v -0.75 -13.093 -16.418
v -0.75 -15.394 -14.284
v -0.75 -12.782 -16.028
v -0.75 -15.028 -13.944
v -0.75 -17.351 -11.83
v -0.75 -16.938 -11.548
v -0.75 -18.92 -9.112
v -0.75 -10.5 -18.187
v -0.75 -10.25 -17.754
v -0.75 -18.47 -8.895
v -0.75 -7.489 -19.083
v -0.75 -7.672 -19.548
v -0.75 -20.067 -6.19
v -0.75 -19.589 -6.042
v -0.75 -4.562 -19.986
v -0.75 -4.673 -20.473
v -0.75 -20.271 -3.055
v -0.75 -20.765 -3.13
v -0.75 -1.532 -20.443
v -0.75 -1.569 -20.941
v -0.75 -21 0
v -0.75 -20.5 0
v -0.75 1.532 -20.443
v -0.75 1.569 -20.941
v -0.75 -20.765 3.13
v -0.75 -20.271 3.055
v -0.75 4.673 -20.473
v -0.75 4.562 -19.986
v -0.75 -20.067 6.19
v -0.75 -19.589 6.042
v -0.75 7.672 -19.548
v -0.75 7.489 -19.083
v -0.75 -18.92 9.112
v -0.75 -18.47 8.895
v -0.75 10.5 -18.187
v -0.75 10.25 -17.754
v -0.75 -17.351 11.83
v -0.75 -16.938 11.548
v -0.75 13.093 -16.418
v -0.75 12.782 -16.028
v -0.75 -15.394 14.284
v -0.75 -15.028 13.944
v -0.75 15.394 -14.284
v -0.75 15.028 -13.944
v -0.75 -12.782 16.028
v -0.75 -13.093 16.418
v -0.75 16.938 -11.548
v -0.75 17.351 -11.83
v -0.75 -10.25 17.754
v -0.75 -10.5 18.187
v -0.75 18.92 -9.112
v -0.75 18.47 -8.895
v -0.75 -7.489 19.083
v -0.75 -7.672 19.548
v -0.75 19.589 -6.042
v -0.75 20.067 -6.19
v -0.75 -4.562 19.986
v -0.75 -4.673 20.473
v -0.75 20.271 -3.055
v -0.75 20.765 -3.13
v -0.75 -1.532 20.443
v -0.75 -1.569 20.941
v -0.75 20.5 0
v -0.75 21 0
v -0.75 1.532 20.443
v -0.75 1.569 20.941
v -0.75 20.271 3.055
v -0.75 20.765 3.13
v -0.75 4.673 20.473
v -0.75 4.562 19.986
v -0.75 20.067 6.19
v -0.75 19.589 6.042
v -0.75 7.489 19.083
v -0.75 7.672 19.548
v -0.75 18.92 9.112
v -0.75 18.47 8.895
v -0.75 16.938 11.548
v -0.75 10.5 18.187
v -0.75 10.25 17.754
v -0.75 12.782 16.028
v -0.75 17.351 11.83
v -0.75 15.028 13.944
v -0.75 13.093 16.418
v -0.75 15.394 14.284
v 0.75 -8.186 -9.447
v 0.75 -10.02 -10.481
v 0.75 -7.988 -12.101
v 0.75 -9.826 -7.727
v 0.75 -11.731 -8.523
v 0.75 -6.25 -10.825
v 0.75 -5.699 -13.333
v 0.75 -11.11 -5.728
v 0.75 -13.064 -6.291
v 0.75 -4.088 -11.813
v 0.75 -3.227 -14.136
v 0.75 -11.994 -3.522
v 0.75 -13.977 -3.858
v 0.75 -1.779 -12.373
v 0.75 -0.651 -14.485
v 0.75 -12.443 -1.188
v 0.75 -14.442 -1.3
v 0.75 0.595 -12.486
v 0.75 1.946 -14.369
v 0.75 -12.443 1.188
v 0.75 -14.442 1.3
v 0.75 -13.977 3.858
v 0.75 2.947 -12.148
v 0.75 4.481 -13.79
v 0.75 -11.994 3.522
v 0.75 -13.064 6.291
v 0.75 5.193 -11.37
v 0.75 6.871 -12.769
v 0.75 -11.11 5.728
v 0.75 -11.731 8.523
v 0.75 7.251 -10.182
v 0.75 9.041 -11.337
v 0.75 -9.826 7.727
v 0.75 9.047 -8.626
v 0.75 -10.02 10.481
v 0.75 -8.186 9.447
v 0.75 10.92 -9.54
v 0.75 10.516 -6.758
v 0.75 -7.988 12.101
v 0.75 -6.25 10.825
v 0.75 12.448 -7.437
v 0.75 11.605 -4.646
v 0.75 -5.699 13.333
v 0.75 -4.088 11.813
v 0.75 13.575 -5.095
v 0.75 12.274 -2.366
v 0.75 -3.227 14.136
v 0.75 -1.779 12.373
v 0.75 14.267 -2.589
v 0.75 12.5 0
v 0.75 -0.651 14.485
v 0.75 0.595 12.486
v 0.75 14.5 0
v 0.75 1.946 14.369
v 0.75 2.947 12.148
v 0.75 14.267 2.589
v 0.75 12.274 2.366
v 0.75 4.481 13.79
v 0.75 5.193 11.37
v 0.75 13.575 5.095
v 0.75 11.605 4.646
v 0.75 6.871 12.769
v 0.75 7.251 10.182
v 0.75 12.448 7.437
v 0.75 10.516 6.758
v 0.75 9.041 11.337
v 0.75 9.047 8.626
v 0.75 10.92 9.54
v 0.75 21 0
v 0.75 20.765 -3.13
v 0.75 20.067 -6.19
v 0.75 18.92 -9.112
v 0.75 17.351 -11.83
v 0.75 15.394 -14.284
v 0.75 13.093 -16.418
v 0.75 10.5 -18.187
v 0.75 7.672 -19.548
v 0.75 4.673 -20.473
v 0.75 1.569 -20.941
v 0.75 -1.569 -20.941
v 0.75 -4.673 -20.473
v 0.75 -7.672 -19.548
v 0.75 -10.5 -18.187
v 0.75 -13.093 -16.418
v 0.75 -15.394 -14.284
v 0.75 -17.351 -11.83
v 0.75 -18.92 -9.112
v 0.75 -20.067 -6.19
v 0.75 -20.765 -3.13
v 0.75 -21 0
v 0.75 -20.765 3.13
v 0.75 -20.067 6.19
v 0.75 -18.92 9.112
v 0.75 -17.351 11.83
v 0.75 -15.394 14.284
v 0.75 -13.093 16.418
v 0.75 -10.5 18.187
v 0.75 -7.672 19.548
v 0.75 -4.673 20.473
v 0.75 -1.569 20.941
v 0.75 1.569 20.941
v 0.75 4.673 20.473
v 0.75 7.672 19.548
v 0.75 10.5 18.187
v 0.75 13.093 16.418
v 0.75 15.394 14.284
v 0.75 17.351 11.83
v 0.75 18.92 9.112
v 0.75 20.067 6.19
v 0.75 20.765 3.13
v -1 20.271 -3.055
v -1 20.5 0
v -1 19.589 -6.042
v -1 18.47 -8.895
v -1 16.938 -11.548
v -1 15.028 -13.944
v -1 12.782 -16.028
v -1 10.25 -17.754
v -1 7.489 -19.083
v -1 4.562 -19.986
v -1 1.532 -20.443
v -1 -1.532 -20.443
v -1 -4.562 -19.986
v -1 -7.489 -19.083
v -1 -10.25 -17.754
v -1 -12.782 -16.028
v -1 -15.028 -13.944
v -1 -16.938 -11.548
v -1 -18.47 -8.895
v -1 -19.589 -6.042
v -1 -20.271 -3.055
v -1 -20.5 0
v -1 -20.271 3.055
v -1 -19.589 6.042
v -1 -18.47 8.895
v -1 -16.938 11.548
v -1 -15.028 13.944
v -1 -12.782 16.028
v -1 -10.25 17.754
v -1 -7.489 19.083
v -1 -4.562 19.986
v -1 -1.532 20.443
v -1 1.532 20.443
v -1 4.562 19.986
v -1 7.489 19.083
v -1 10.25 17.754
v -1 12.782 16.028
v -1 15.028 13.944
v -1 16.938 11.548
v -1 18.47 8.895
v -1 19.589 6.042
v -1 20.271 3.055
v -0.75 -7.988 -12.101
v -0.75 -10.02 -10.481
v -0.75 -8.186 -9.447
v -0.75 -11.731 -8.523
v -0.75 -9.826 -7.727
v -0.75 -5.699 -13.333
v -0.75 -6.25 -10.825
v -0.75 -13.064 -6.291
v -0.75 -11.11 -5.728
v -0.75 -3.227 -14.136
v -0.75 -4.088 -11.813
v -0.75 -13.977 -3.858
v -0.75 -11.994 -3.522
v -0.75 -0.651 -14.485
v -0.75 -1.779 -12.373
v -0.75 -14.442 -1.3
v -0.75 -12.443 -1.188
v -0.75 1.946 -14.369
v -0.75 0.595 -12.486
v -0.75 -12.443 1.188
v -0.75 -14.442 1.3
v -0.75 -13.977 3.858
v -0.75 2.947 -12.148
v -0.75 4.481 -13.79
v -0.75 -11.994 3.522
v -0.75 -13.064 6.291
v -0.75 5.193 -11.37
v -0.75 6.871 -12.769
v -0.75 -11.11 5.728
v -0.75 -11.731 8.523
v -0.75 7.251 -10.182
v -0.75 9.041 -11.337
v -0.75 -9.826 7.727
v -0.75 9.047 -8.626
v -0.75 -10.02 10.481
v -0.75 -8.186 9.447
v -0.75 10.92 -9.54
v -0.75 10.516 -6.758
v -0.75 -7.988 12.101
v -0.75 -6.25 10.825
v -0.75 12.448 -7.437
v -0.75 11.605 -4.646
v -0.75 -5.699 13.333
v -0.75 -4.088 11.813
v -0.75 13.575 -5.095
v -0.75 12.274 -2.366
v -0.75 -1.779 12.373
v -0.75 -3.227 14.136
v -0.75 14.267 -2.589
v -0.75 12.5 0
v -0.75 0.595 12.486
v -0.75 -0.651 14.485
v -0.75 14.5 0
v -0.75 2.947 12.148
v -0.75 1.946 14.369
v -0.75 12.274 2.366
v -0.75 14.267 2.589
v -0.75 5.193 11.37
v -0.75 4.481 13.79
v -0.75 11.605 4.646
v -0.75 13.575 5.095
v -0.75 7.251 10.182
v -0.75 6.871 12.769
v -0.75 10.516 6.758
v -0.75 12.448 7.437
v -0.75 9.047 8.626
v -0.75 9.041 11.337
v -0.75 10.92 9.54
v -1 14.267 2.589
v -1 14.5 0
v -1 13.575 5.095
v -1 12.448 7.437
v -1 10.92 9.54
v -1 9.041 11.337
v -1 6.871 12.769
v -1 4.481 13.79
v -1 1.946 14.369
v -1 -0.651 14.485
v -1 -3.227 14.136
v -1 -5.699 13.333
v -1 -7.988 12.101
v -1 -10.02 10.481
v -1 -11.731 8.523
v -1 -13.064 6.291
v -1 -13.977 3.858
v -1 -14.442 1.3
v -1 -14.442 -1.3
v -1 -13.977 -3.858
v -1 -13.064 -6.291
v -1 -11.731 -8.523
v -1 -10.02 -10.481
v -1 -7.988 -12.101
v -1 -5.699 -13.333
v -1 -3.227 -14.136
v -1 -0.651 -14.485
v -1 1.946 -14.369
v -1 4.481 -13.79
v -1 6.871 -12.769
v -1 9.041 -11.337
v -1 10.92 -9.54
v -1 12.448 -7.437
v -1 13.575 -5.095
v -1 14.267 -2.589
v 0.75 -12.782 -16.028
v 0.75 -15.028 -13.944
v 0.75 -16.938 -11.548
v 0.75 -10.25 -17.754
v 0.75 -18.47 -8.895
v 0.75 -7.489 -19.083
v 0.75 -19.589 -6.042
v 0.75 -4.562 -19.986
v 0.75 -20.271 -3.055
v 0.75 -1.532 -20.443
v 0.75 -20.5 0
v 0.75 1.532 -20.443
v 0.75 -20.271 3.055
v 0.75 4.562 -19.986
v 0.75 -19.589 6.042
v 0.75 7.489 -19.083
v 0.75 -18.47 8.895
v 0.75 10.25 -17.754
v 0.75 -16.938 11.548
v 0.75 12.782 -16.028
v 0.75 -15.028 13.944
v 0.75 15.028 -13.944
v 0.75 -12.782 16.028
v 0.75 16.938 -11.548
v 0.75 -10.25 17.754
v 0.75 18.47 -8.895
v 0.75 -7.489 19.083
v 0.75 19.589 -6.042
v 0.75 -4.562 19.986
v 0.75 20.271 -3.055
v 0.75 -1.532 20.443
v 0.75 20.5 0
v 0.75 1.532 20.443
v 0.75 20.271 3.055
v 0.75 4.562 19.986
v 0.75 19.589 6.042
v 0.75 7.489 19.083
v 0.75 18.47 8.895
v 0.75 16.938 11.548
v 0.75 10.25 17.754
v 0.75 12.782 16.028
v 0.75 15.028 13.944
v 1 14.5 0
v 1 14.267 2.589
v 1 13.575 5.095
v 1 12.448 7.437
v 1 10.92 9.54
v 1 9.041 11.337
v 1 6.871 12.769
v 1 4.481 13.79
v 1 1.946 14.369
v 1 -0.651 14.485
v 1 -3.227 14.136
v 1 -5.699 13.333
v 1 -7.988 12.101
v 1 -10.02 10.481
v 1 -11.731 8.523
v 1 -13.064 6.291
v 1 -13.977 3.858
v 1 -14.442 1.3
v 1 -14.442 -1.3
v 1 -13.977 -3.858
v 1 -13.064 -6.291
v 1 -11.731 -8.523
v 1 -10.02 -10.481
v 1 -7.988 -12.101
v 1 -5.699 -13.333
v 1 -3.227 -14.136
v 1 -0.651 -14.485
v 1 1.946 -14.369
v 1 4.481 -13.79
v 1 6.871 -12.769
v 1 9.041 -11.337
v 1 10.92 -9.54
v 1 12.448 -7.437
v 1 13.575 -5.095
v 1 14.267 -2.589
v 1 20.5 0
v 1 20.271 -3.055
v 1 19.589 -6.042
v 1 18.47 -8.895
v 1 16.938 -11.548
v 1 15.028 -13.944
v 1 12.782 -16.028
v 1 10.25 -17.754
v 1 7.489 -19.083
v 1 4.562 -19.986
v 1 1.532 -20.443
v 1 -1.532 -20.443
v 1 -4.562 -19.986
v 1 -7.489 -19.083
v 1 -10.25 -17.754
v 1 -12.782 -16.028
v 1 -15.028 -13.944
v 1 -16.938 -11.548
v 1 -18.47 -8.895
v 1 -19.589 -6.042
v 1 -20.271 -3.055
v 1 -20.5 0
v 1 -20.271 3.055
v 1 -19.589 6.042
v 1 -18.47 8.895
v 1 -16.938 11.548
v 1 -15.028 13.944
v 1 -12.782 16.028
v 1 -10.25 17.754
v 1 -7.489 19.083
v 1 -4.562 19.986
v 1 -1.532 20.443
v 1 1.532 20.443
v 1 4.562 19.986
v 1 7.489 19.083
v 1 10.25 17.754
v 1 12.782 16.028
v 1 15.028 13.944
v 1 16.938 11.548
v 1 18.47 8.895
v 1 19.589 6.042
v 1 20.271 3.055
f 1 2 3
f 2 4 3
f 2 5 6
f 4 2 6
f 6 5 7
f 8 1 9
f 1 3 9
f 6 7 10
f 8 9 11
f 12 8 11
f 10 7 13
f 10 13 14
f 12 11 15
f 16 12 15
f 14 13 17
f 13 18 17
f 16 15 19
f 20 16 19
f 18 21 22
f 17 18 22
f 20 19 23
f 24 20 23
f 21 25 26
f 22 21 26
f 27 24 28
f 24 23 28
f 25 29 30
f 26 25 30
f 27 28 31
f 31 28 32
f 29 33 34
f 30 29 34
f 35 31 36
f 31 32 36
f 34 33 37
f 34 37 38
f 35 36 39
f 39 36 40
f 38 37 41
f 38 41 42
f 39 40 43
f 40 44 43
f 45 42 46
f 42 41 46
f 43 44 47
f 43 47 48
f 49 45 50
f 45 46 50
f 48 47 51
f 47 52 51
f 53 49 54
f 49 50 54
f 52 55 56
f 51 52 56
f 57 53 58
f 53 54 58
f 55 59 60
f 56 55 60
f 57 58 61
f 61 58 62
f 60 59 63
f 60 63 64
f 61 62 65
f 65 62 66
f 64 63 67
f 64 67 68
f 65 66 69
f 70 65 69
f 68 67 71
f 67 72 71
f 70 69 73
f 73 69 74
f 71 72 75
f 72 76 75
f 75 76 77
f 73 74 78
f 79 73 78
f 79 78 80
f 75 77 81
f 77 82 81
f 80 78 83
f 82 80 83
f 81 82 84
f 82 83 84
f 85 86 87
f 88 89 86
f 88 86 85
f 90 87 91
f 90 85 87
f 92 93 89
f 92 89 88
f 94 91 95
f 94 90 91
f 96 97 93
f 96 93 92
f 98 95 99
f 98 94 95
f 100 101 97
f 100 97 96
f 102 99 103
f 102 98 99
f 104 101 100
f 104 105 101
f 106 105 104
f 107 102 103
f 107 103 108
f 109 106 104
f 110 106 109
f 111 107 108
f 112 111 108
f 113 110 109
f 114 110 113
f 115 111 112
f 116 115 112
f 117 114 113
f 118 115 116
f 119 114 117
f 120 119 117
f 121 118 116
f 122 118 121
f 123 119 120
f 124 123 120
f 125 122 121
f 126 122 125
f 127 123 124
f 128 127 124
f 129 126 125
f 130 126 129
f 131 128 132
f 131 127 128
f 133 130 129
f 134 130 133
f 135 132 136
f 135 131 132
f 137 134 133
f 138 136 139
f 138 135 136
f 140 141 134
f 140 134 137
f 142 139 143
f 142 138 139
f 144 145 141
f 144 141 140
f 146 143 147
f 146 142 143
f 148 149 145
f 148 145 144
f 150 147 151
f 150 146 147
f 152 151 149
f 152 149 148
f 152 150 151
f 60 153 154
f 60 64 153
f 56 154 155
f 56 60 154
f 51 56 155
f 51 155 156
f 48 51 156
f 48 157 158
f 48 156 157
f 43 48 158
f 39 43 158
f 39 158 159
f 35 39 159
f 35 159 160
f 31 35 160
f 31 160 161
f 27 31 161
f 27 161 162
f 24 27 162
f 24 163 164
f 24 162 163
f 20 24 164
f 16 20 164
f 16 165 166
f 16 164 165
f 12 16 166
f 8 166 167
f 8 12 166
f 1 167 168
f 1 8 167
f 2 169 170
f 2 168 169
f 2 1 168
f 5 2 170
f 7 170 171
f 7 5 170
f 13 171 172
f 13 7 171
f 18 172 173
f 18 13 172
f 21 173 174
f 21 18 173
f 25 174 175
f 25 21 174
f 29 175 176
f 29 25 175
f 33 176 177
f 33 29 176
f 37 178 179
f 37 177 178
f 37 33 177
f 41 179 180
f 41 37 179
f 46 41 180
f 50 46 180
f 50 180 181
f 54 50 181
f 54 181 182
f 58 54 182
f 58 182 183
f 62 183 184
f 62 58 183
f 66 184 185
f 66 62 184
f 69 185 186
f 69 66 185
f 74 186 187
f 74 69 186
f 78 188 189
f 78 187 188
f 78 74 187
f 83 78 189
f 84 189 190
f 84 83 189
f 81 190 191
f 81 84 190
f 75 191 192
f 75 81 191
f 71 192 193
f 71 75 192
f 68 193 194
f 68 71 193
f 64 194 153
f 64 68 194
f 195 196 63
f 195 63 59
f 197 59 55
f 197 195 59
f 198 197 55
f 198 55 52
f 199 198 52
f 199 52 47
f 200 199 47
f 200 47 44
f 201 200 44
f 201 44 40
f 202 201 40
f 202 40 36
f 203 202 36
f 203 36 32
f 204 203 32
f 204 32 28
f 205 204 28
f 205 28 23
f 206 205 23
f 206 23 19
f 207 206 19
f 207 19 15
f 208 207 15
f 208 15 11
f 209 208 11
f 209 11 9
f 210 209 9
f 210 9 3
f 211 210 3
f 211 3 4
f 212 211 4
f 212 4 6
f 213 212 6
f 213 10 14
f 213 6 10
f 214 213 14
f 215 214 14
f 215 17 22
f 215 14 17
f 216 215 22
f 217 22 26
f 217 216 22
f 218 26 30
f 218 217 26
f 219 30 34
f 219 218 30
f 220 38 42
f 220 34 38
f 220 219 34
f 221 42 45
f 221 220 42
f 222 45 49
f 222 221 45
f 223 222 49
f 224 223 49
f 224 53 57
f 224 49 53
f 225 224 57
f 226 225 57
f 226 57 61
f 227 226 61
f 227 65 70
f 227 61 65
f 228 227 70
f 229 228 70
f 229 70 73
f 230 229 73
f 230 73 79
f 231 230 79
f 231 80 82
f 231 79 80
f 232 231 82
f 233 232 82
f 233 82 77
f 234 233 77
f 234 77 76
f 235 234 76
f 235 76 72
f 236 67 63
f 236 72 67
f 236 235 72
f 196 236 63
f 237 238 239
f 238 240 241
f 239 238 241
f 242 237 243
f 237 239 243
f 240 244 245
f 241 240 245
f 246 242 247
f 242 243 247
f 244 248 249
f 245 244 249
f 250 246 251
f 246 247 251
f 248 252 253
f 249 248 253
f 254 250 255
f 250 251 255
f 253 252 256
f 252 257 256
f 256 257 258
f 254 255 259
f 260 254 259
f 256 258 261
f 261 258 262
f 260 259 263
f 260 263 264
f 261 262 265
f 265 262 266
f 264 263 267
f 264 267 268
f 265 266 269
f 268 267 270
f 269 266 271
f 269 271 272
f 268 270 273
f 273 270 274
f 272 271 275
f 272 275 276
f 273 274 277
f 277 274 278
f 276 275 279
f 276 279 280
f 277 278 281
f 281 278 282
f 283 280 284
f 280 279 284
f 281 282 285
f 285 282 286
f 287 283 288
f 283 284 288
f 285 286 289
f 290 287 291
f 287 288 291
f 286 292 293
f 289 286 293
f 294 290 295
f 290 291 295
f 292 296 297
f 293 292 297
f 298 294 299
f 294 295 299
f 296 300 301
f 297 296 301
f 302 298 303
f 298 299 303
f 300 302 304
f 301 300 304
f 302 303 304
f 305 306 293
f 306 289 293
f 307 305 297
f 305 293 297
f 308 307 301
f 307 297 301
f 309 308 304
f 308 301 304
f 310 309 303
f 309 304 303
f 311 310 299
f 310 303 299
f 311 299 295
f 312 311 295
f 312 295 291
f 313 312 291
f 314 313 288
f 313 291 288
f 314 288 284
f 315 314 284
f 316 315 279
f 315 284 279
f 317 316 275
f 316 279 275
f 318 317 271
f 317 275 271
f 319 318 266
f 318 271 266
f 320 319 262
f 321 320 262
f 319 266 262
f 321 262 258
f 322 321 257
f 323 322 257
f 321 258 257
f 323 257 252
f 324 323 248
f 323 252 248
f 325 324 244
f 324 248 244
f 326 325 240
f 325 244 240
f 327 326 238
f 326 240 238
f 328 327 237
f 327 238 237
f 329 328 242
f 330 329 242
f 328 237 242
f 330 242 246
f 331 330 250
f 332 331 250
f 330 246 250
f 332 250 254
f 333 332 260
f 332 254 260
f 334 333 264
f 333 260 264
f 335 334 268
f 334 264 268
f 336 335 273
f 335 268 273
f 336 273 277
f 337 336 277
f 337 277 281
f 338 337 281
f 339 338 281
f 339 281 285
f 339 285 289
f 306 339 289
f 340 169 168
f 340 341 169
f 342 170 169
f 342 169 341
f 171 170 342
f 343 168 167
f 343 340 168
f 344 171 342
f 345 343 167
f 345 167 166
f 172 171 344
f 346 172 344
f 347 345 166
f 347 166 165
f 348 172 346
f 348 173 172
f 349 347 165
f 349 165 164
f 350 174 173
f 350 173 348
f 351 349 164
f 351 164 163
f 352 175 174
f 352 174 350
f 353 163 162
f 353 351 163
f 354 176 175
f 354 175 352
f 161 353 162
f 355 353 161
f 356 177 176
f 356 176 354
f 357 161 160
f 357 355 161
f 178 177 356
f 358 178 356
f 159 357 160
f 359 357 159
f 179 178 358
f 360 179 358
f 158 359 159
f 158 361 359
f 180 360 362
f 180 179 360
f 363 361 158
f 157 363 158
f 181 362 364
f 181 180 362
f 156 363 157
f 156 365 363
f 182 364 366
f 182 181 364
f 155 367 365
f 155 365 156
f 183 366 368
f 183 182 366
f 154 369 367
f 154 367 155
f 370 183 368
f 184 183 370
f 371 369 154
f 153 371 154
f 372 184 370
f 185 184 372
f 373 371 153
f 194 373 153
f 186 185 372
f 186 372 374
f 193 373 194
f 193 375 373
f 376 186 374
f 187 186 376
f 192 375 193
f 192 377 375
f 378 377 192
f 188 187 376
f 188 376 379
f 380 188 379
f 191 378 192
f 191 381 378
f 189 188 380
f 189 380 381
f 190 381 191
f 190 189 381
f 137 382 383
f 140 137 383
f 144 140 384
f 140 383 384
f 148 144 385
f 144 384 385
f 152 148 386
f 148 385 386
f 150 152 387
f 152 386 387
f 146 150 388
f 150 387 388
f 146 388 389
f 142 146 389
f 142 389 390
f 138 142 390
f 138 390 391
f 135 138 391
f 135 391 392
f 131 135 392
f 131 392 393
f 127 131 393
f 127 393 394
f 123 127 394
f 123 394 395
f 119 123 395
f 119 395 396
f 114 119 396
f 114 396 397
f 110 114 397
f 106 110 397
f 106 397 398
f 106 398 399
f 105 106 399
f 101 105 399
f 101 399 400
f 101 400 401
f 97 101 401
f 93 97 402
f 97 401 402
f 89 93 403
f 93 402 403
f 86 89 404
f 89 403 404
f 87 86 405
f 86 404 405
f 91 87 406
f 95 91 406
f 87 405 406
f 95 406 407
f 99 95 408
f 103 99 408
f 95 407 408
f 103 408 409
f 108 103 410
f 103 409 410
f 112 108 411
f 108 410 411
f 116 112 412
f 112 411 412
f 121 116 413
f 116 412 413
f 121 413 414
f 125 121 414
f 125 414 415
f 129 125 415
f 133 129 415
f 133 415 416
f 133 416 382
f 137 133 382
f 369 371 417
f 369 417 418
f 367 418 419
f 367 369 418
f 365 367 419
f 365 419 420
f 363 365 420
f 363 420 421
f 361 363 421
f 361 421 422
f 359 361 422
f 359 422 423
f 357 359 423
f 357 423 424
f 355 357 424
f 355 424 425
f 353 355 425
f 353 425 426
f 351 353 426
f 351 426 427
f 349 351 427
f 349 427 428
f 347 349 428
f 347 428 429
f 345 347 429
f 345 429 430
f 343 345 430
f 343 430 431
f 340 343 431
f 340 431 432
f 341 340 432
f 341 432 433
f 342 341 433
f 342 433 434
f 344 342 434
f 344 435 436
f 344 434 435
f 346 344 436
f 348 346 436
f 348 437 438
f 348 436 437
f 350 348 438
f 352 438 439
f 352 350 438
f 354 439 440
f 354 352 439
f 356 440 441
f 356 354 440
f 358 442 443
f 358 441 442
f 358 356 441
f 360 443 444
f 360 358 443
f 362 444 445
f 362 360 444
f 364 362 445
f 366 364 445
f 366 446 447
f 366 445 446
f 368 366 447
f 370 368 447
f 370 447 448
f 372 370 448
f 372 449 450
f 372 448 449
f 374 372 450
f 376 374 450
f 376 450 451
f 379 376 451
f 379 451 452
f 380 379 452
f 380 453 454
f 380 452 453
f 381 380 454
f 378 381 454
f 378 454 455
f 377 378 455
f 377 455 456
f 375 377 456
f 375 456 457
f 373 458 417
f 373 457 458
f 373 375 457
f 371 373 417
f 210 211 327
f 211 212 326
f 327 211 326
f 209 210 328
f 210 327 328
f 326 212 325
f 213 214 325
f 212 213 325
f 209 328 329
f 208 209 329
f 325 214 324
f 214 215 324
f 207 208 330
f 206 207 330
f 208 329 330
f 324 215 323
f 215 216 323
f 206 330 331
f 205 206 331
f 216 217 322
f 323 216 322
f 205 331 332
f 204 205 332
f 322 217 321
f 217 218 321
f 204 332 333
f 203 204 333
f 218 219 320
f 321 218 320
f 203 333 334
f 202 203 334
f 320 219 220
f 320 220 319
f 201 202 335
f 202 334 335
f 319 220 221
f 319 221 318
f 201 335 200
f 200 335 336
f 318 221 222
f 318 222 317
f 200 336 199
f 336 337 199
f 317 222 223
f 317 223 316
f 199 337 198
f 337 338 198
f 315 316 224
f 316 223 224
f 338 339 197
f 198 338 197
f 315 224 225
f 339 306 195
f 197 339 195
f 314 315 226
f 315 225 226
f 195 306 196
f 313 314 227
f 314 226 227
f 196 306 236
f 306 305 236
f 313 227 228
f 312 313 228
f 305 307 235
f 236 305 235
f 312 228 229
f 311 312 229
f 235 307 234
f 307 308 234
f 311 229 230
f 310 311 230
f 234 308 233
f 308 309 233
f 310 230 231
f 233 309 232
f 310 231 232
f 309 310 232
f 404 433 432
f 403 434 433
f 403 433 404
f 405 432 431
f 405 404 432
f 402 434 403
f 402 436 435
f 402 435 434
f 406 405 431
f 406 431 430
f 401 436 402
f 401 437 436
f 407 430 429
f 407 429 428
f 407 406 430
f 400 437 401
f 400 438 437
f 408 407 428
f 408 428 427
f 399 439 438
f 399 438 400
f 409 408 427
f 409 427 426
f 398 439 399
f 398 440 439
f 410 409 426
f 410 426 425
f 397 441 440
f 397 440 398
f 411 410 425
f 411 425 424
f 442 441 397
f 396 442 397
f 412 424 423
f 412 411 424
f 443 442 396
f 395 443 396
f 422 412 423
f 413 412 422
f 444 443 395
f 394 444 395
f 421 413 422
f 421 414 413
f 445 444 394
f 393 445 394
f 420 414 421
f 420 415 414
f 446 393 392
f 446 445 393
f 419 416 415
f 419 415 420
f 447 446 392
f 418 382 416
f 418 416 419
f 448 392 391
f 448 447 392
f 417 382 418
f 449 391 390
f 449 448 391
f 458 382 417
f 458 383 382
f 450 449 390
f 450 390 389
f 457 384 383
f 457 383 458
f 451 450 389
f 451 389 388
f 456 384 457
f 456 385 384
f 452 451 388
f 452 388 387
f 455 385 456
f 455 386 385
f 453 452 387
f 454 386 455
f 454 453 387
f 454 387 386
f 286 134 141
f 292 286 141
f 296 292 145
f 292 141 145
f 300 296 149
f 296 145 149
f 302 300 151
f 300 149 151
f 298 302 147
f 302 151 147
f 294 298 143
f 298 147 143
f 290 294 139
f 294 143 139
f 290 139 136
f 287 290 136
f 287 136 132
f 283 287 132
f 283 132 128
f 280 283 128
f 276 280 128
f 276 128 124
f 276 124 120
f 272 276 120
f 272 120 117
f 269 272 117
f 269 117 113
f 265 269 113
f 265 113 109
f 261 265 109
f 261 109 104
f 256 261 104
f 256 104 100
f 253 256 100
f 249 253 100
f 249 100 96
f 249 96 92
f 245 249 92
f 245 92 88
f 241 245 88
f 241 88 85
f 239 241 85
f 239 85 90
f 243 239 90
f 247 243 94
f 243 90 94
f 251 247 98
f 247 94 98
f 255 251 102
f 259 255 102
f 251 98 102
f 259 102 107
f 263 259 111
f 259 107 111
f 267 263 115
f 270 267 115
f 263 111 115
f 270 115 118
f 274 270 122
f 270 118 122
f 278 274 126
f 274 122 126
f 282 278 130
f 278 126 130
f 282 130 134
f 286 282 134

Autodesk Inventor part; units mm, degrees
sketch "Sketch_1" plane through (0, 0, 0) normal (0, 0, 1) x (1, 0, 0)
  line L0 (50, 0) -> (-50, 0)
  line L1 (-1, 20.5) -> (-1, 14.5)
  line L2 (-1, 14.5) -> (-0.75, 14.5)
  line L3 (-0.75, 14.5) -> (-0.75, 12.5)
  line L4 (-0.75, 12.5) -> (0.75, 12.5)
  line L5 (0.75, 12.5) -> (0.75, 14.5)
  line L6 (0.75, 14.5) -> (1, 14.5)
  line L7 (1, 14.5) -> (1, 20.5)
  line L8 (1, 20.5) -> (0.75, 20.5)
  line L9 (0.75, 20.5) -> (0.75, 21)
  line L10 (0.75, 21) -> (-0.75, 21)
  line L11 (-0.75, 21) -> (-0.75, 20.5)
  line L12 (-0.75, 20.5) -> (-1, 20.5)
revolve "Revolution1" add sketch "Sketch_1" angle 360 about axis through (50, 0, 0) along (1, 0, 0)
ref_plane "core_to_washer_XY" through (0, 0, 0) normal (1, 0, 0) x (0, 0, -1)
ref_plane "core_to_washer_YZ" through (0, 0, 0) normal (0, 0, -1) x (0, 1, 0)
ref_plane "core_to_washer_ZX" through (0, 0, 0) normal (0, 1, 0) x (1, 0, 0)
ref_plane "core_to_washer1_XY" through (0, 0, 0) normal (-1, 0, 0) x (0, 0, -1)
ref_plane "core_to_washer1_YZ" through (0, 0, 0) normal (0, 0, -1) x (0, -1, 0)
ref_plane "core_to_washer1_ZX" through (0, 0, 0) normal (0, -1, 0) x (-1, 0, 0)
properties part number "core_BA2542"
